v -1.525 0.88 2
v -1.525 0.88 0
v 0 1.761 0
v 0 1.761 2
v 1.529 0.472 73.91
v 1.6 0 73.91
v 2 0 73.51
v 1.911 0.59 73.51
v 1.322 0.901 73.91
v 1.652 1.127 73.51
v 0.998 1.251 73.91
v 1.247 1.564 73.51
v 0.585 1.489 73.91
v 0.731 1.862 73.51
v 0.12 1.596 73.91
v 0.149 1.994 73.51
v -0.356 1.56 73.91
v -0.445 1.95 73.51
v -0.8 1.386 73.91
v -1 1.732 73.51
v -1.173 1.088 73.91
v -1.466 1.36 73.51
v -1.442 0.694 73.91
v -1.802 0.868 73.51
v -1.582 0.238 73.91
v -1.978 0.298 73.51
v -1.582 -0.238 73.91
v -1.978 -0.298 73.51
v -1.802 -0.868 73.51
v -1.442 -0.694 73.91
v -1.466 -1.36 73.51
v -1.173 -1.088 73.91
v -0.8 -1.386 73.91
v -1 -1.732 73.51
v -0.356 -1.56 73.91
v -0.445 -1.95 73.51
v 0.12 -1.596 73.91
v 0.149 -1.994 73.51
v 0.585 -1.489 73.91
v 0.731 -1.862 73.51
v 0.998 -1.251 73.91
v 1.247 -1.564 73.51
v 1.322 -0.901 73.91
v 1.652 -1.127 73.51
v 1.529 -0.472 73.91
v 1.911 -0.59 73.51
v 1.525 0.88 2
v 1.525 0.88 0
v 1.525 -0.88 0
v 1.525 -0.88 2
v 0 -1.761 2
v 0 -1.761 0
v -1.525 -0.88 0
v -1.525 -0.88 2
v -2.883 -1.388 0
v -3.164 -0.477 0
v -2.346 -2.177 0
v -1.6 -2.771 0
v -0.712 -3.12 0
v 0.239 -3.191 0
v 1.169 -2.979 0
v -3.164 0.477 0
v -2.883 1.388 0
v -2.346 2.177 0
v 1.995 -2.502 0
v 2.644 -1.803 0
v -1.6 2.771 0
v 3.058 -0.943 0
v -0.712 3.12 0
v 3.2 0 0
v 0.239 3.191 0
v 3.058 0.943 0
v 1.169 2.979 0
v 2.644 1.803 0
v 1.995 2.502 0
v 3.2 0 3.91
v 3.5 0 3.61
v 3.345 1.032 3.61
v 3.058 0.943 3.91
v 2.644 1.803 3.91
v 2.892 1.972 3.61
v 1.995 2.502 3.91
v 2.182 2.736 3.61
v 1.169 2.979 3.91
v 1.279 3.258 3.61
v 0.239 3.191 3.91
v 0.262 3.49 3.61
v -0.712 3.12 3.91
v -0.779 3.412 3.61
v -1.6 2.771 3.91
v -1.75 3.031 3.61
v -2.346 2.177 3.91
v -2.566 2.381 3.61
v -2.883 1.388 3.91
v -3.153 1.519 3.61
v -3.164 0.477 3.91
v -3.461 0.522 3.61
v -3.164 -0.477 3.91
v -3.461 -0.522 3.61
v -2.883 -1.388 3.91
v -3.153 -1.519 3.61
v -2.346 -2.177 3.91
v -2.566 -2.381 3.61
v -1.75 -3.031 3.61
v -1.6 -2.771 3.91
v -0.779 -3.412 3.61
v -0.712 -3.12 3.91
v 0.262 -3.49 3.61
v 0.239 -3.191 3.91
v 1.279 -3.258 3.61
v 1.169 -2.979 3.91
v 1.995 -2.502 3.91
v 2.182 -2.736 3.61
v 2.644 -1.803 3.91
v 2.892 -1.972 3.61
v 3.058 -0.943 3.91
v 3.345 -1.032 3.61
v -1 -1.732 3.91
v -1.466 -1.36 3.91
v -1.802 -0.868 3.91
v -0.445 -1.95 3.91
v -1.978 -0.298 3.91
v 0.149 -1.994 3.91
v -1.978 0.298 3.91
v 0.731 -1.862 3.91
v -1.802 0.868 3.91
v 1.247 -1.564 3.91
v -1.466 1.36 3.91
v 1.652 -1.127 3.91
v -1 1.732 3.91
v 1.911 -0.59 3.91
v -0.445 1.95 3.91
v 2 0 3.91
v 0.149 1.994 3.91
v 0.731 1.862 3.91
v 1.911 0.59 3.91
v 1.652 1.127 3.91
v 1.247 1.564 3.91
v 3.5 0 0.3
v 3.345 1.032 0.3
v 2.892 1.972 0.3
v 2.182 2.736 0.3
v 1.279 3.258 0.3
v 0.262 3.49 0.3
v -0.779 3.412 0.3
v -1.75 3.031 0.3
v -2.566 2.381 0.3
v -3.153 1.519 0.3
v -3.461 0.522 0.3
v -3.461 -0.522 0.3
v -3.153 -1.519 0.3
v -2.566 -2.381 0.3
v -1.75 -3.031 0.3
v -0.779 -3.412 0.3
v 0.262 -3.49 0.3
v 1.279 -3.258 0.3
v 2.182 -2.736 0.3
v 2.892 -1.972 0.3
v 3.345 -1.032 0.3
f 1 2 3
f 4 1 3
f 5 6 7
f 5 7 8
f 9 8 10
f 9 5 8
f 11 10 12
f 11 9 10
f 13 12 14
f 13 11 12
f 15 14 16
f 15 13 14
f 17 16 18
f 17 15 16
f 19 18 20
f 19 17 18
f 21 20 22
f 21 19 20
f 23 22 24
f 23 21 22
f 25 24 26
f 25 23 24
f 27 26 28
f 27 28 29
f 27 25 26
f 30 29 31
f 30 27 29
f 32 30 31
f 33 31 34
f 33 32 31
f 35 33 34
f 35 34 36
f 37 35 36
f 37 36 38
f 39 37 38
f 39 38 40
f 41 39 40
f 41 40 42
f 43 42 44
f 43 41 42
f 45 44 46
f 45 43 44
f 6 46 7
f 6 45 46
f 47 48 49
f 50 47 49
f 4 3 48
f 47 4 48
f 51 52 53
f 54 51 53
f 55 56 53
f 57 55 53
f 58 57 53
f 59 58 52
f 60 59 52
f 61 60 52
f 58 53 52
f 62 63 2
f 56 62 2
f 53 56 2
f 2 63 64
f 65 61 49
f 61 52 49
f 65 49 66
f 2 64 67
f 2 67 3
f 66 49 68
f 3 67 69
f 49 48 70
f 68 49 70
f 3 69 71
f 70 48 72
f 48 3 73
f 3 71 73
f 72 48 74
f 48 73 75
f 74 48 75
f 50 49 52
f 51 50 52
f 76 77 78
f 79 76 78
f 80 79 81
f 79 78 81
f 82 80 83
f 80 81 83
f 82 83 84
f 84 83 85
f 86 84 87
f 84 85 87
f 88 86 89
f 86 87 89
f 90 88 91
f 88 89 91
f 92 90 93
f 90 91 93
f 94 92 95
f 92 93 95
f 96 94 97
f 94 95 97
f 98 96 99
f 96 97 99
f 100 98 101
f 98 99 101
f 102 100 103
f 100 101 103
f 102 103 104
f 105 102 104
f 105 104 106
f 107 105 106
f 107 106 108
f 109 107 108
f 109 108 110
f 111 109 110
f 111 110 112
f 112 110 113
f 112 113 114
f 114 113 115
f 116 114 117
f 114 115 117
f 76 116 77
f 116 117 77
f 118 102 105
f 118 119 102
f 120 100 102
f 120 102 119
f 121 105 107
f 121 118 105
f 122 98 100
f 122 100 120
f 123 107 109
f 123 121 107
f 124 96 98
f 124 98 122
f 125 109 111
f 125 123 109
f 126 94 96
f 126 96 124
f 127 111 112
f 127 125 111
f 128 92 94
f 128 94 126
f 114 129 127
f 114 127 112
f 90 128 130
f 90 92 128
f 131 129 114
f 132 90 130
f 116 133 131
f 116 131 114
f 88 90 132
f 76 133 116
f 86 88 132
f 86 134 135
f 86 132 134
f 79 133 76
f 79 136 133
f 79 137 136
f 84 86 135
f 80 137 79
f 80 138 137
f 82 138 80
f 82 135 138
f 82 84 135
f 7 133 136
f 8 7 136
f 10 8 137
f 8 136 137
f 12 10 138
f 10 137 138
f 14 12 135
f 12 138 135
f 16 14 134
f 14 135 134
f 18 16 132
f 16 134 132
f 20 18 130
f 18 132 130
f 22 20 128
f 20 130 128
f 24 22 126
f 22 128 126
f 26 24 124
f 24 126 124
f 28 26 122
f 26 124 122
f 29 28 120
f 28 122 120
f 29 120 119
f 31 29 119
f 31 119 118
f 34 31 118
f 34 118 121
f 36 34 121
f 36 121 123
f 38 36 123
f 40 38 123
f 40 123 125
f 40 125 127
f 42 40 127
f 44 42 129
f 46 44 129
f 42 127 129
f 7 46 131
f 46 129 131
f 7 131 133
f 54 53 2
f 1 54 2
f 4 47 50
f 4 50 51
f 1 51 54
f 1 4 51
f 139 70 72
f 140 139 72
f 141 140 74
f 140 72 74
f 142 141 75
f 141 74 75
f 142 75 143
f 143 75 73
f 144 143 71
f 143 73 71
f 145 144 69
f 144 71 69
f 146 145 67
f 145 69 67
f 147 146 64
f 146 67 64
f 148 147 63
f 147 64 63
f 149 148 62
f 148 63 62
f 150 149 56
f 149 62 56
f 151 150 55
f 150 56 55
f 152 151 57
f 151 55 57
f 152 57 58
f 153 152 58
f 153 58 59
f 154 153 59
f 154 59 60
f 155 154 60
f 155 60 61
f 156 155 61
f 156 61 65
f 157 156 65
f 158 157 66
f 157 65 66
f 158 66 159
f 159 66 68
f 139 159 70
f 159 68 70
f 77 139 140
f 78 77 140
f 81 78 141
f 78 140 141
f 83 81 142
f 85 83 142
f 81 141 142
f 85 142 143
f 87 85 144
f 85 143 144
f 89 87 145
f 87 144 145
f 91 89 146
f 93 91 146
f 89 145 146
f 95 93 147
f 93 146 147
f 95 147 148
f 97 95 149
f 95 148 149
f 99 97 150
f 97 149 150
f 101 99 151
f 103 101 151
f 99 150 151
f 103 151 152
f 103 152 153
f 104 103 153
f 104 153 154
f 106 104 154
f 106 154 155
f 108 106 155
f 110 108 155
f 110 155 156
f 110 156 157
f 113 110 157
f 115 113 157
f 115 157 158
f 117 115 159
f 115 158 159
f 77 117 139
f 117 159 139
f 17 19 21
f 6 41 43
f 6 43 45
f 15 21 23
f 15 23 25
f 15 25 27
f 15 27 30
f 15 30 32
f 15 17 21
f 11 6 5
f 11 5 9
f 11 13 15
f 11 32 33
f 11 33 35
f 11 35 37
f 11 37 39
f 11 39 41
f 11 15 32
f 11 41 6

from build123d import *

# Parameters (mm, degrees)
SKETCH_1_R          = 3.5
EXTRUDE_1_DEPTH     = 3.91
SKETCH_2_R          = 2
EXTRUDE_2_DEPTH     = 70
CUT_EXTRUDE_1_DEPTH = 2
CHAMFER_1_SIZE      = 0.4
CHAMFER_2_SIZE      = 0.3


with BuildPart() as part:
    # 草图1 → 凸台-拉伸1 (new body)
    with BuildSketch(Plane.XY):
        Circle(SKETCH_1_R)
    extrude(amount=EXTRUDE_1_DEPTH)

    # 草图2 → 凸台-拉伸2 (add)
    with BuildSketch(Plane.XY.offset(3.91)):
        Circle(SKETCH_2_R)
    extrude(amount=EXTRUDE_2_DEPTH)

    # 草图3 → 切除-拉伸1 (cut)
    with BuildSketch(Plane(origin=(0, 0, 0), x_dir=(-1, 0, 0), z_dir=(0, 0, -1))):
        Polygon((0, 1.760918321), (-1.525, 0.880459161), (-1.525, -0.880459161), (0, -1.760918321), (1.525, -0.880459161), (1.525, 0.880459161), align=None)
    extrude(amount=-CUT_EXTRUDE_1_DEPTH, mode=Mode.SUBTRACT)

    # 倒角1
    chamfer_1_edges = [part.edges().sort_by_distance(p)[0] for p in [
        (-2, 0, 73.91),
    ]]
    chamfer(chamfer_1_edges, length=CHAMFER_1_SIZE)

    # 倒角2
    chamfer_2_edges = [part.edges().sort_by_distance(p)[0] for p in [
        (-3.5, 0, 0),
        (-3.5, 0, 3.91),
    ]]
    chamfer(chamfer_2_edges, length=CHAMFER_2_SIZE)


solid = part.part
